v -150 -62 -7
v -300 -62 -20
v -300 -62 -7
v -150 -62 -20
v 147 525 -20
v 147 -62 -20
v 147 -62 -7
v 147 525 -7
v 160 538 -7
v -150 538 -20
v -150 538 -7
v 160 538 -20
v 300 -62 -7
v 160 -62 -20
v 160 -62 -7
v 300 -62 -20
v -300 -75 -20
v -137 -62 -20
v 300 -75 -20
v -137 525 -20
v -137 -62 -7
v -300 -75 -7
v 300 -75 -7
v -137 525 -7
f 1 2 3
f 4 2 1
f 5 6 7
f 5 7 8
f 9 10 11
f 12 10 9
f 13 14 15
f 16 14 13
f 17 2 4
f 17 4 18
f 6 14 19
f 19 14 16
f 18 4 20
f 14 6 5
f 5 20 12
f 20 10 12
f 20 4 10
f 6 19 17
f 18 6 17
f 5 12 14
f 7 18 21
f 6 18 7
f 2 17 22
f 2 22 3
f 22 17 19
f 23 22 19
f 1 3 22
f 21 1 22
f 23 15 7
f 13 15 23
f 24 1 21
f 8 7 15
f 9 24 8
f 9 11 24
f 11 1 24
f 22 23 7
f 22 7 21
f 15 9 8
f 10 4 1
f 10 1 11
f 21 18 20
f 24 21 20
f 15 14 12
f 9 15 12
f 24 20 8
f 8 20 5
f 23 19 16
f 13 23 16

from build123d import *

# Parameters (mm, degrees)
BOX034_W     = 284
BOX034_H     = 13
BOX034_DEPTH = 13
BOX011_W     = 13
BOX011_H     = 600
BOX011_DEPTH = 13
BOX007_W     = 600
BOX007_H     = 13
BOX007_DEPTH = 13
BOX010_W     = 13
BOX010_H     = 600
BOX010_DEPTH = 13


with BuildPart() as cube031:
    # Box034 → Box034 (new body)
    with BuildSketch(Plane(origin=(-137, 525, -20), x_dir=(1, 0, 0), z_dir=(0, 0, 1))):
        with Locations((142, 6.5)):
            Rectangle(BOX034_W, BOX034_H)
    extrude(amount=BOX034_DEPTH)


with BuildPart() as cube008:
    # Box011 → Box011 (new body)
    with BuildSketch(Plane(origin=(-150, -62, -20), x_dir=(1, 0, 0), z_dir=(0, 0, 1))):
        with Locations((6.5, 300)):
            Rectangle(BOX011_W, BOX011_H)
    extrude(amount=BOX011_DEPTH)


with BuildPart() as frame_front:
    # Box007 → Box007 (new body)
    with BuildSketch(Plane(origin=(-300, -75, -20), x_dir=(1, 0, 0), z_dir=(0, 0, 1))):
        with Locations((300, 6.5)):
            Rectangle(BOX007_W, BOX007_H)
    extrude(amount=BOX007_DEPTH)


with BuildPart() as frame_full:
    # Box010 → Box010 (new body)
    with BuildSketch(Plane(origin=(147, -62, -20), x_dir=(1, 0, 0), z_dir=(0, 0, 1))):
        with Locations((6.5, 300)):
            Rectangle(BOX010_W, BOX010_H)
    extrude(amount=BOX010_DEPTH)

    # Connect014: union Cube008, Frame_Front
    add(cube008.part)
    add(frame_front.part)

    # Connect015: union Cube031
    add(cube031.part)


solid = frame_full.part
